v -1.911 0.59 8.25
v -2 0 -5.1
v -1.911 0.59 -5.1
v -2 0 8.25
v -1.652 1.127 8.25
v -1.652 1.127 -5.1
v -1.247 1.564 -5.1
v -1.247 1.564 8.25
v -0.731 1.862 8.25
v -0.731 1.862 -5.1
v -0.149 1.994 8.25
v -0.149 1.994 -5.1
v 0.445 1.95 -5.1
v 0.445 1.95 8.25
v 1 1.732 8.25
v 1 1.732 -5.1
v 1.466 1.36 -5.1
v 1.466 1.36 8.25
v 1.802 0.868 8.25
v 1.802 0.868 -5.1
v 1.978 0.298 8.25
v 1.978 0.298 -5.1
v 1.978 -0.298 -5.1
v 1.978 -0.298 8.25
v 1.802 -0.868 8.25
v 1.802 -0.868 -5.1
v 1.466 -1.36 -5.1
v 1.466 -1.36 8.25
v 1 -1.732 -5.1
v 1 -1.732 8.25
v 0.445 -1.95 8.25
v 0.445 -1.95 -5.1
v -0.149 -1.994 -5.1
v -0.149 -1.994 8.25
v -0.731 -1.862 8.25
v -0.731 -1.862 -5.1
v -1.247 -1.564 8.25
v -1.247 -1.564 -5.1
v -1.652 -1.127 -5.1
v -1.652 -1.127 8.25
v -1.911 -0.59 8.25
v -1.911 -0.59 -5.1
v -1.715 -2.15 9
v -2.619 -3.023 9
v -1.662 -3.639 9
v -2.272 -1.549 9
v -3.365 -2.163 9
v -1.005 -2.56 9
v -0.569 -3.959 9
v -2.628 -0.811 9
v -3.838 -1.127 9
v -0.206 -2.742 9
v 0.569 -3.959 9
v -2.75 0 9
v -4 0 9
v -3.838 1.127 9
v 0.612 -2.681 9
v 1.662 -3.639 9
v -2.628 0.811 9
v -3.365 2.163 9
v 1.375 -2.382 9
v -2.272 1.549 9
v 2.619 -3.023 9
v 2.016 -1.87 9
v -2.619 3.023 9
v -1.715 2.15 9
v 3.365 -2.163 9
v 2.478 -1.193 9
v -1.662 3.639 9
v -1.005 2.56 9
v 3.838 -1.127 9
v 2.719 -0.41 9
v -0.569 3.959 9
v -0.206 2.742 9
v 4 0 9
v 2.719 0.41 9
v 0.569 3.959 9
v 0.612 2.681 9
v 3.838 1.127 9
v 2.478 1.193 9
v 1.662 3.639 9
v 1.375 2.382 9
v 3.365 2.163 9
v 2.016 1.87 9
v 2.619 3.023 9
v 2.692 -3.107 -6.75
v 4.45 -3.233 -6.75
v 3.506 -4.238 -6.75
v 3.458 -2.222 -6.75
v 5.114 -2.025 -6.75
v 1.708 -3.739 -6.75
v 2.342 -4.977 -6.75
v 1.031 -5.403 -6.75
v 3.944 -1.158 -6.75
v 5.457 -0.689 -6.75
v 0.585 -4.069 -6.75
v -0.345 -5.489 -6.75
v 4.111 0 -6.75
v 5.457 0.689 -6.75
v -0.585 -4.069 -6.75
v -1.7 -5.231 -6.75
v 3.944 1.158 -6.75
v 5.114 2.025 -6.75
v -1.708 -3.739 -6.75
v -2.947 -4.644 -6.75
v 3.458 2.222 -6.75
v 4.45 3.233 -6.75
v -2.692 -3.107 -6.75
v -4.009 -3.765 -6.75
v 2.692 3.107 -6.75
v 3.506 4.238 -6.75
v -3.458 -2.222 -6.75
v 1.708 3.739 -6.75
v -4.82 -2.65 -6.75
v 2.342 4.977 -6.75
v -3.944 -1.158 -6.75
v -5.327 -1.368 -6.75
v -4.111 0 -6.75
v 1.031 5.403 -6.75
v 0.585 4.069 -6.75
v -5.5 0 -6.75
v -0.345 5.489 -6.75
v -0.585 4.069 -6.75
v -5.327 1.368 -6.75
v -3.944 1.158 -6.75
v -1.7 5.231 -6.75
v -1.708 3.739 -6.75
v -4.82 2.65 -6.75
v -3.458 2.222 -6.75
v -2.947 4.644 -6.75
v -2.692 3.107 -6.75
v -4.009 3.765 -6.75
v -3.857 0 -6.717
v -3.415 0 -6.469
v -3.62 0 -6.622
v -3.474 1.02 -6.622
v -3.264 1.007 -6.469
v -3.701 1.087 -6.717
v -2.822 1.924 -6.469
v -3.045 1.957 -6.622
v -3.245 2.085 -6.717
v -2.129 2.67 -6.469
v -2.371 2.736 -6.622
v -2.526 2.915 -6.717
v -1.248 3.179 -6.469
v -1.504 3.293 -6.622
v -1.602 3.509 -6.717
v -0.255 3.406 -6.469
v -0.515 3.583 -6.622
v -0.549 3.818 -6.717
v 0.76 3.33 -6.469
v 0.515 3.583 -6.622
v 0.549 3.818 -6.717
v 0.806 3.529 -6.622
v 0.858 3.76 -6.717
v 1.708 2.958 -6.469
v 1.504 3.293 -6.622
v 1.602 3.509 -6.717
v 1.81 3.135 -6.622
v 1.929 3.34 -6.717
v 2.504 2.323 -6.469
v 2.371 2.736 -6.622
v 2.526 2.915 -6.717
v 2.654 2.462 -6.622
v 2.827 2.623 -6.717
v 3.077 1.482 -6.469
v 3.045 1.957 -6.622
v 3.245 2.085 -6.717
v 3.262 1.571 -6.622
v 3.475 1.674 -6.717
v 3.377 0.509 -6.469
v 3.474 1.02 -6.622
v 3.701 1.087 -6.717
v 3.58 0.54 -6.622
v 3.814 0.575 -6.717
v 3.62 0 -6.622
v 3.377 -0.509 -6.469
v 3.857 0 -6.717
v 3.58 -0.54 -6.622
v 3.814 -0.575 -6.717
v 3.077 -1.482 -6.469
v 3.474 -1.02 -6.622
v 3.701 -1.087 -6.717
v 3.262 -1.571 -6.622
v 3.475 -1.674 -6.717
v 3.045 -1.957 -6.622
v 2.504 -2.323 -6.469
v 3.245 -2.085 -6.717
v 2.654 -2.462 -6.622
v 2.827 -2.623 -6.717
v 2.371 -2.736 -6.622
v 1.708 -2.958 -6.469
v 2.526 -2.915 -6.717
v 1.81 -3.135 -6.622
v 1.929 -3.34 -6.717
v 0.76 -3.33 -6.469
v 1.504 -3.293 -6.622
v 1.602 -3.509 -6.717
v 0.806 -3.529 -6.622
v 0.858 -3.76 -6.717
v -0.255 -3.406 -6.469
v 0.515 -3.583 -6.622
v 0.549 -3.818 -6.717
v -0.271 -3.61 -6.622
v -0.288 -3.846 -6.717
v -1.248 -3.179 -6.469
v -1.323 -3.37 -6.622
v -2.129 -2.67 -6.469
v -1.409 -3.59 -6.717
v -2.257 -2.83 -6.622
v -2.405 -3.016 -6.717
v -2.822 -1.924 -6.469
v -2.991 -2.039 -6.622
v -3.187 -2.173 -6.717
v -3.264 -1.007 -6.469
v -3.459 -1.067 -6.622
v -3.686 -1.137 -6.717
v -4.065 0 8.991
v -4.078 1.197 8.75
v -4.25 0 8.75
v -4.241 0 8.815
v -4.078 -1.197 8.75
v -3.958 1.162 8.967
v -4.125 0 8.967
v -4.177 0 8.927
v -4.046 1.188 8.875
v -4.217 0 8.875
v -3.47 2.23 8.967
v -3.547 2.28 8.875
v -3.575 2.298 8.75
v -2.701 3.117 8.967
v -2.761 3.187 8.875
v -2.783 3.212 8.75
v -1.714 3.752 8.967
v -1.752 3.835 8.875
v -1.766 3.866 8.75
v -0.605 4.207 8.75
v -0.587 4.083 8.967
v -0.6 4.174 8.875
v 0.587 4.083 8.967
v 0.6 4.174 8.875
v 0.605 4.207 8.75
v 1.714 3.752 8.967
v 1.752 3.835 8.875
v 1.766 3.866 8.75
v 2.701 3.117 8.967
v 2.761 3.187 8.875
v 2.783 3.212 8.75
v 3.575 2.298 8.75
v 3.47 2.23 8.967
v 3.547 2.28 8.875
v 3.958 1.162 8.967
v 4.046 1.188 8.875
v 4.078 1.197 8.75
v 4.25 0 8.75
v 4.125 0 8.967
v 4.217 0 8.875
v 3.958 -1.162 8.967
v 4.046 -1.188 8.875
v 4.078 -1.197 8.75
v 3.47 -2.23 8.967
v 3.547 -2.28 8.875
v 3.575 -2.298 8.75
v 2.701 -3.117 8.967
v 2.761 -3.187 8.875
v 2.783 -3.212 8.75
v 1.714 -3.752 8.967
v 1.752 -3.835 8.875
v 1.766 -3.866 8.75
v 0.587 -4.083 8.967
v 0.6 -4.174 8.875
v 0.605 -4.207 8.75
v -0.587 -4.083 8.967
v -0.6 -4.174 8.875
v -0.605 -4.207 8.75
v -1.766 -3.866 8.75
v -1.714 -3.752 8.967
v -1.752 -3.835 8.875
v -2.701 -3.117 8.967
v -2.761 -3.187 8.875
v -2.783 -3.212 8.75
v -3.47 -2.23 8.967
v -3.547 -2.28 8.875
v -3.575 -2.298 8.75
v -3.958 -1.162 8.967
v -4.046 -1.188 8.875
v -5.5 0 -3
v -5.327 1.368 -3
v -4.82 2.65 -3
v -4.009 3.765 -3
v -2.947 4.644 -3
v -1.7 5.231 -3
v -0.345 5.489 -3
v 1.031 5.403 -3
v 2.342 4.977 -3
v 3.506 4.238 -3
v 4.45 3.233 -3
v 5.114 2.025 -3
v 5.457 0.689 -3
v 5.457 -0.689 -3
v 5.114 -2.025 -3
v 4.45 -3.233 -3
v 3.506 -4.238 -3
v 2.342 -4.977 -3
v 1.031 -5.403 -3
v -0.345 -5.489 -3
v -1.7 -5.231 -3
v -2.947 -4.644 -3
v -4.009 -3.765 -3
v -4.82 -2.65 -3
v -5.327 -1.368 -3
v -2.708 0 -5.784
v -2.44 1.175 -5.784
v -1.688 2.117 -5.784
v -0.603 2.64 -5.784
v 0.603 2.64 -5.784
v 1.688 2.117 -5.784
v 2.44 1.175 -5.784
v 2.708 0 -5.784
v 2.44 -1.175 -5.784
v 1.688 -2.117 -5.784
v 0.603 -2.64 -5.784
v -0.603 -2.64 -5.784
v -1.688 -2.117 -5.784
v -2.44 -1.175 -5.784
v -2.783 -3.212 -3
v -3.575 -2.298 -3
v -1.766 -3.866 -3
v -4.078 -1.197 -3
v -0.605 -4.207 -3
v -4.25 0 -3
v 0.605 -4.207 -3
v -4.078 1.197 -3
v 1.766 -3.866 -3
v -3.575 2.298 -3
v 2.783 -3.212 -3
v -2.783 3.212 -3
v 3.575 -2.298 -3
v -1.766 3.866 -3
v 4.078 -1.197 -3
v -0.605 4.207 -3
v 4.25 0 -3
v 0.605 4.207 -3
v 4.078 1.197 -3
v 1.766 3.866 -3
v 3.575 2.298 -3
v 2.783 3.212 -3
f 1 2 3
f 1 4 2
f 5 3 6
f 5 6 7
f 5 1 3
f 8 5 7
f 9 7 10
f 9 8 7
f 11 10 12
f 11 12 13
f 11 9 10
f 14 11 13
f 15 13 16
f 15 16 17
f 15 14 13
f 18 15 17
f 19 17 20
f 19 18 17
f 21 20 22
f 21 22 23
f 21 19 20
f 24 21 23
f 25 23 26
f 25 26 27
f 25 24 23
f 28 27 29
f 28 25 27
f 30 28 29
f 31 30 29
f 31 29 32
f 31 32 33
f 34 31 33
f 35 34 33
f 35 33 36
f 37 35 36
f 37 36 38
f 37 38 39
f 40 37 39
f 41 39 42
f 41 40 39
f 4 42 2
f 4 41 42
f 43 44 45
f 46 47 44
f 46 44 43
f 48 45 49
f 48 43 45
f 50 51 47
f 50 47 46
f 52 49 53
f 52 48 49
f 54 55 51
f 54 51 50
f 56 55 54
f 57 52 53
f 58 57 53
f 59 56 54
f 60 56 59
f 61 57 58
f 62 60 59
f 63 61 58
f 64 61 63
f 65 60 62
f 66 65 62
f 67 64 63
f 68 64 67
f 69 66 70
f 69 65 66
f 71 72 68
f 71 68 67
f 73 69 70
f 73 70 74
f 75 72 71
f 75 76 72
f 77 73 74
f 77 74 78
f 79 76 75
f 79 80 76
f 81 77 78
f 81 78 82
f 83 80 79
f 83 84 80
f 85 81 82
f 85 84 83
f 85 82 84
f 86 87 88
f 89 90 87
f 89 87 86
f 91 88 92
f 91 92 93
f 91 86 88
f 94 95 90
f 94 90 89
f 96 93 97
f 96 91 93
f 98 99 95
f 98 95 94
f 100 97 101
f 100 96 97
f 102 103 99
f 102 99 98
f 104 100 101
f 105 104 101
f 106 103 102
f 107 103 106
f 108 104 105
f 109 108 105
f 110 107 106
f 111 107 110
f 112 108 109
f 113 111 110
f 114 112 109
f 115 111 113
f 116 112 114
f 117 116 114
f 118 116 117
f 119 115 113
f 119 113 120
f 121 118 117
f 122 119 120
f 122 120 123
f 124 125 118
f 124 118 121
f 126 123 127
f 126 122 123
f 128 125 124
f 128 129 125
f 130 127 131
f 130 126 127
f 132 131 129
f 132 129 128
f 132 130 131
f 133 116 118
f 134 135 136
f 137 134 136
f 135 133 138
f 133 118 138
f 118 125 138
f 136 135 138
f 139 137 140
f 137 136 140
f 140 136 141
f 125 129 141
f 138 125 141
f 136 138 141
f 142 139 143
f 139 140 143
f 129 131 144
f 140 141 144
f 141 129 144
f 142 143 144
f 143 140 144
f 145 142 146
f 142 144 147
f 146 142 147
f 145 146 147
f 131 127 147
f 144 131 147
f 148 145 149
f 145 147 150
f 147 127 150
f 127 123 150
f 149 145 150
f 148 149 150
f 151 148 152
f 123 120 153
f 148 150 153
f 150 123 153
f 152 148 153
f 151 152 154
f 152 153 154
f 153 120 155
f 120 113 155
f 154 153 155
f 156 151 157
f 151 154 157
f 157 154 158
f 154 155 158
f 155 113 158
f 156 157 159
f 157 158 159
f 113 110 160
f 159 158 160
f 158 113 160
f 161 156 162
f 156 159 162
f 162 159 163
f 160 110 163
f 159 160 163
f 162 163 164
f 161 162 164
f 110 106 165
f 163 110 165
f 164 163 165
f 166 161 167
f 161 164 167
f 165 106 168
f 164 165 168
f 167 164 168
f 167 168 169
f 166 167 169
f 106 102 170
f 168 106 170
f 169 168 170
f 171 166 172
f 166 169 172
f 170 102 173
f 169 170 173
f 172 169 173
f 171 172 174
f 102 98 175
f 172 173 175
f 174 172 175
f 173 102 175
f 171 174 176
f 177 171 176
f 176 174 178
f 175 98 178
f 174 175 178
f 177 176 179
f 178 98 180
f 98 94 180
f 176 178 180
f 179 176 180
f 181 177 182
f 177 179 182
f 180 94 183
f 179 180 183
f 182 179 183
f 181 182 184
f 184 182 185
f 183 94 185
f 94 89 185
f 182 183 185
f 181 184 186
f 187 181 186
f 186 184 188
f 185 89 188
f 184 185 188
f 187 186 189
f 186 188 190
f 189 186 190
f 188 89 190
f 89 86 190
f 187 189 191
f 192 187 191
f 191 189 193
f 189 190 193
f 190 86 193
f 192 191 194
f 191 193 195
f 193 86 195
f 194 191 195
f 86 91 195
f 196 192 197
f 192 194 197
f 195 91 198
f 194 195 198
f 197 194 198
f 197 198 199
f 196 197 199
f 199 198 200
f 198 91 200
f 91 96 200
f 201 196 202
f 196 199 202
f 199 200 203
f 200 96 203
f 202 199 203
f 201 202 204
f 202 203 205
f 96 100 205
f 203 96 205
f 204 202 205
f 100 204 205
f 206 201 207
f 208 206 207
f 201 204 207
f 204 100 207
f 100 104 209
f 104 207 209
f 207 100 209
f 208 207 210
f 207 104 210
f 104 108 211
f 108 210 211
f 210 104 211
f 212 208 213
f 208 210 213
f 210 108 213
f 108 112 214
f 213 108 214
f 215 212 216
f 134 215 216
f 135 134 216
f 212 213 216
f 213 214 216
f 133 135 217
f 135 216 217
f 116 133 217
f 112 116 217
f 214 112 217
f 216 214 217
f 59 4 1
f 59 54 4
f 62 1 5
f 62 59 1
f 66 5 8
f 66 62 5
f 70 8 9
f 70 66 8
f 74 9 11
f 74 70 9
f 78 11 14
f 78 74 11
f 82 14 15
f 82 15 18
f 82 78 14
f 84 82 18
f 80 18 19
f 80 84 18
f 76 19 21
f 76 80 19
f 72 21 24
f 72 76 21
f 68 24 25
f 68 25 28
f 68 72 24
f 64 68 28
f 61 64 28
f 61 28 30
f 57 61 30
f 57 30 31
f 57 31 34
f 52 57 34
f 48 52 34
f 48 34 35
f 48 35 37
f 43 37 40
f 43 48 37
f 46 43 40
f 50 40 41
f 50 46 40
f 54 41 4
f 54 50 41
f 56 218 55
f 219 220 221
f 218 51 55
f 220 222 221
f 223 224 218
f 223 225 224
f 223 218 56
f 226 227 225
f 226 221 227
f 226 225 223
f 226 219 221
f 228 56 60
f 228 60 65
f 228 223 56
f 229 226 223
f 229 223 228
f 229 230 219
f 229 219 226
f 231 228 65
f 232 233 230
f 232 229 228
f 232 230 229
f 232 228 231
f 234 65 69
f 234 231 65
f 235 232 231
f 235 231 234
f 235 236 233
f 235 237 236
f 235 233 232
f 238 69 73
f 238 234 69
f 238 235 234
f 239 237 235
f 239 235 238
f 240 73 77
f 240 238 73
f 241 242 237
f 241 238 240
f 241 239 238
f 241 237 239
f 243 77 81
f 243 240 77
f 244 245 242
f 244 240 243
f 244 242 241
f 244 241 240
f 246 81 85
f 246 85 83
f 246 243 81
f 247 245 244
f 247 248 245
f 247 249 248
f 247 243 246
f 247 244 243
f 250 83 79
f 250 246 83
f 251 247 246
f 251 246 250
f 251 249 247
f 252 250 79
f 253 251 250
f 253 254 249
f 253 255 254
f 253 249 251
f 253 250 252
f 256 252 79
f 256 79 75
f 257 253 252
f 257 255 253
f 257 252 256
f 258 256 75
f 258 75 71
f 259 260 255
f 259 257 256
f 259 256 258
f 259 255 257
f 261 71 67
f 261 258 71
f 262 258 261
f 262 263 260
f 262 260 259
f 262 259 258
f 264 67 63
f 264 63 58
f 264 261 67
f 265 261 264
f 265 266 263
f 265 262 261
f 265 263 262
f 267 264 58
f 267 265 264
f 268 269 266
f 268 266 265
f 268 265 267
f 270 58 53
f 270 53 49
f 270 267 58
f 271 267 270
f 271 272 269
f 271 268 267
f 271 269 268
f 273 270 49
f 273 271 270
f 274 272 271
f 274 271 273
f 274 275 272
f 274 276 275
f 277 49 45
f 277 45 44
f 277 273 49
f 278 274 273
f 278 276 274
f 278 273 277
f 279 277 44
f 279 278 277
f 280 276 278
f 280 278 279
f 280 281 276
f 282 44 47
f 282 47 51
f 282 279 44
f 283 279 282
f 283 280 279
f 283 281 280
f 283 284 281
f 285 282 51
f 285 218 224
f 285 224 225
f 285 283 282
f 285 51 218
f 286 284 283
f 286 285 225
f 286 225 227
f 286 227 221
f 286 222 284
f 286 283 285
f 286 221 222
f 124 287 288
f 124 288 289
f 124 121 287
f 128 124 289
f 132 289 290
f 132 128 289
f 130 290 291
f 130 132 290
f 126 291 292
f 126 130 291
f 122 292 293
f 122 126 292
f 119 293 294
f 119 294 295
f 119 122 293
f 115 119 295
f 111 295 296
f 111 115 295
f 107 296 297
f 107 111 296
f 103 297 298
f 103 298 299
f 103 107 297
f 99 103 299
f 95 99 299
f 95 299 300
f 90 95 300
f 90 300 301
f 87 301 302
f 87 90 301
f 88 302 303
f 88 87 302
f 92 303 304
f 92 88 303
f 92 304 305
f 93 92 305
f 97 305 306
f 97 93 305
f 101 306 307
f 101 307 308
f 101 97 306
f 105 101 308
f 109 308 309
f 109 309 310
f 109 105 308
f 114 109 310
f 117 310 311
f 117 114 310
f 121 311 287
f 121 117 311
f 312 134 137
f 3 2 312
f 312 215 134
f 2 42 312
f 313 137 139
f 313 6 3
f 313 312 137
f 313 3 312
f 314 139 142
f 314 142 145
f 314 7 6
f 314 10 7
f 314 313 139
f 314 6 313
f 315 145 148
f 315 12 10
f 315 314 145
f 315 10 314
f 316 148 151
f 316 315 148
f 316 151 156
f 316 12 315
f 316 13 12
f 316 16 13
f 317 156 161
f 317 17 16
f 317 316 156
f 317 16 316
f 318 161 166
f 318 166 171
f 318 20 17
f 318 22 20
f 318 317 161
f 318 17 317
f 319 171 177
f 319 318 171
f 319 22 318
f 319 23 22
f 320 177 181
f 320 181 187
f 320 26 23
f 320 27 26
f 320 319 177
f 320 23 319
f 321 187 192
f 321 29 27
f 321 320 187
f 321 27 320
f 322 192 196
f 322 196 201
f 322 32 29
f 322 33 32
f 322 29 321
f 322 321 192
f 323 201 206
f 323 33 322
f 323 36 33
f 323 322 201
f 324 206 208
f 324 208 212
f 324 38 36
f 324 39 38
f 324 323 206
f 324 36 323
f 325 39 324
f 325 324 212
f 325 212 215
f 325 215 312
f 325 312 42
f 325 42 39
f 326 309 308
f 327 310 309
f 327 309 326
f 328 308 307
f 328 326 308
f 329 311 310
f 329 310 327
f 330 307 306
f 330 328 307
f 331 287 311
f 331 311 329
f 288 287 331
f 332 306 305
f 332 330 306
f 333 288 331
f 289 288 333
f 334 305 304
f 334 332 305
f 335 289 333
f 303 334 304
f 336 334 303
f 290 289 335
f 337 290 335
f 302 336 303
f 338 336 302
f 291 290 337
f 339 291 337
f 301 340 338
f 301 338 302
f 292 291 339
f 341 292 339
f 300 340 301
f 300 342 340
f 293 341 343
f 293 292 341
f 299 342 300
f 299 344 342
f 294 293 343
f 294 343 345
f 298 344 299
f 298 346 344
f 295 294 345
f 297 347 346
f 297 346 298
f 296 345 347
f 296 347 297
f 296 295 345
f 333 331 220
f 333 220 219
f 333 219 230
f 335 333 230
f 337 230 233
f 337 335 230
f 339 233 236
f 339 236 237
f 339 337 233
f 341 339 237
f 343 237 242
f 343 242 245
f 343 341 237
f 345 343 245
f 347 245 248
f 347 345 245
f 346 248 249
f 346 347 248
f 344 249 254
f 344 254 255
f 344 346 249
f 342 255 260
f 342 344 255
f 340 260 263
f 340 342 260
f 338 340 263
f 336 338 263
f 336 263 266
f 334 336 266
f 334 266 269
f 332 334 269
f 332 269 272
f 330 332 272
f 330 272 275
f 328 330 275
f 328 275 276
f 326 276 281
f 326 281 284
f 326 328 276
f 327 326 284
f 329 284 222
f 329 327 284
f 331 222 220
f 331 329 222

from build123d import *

# Parameters (mm, degrees)
F2_R = 0.25
F3_R = 1


with BuildPart() as f1:
    # F0 (on Front) → F1 (revolve)
    with BuildSketch(Plane.XZ):
        Polygon((-2, 8.25), (-2.75, 9), (-4.25, 9), (-4.25, 6.75), (-4.25, 6), (-4.25, -3), (-5.5, -3), (-5.5, -6.75), (-4.25, -6.75), (-3.706053, -6.75), (-2, -5.100015), align=None)
    revolve(axis=Axis((0, 0, 1.255823), (0, 0, -1)))

    # F2
    f2_edges = [f1.edges().sort_by_distance(p)[0] for p in [
        (4.25, 0, 9),
    ]]
    fillet(f2_edges, radius=F2_R)

    # F3
    f3_edges = [f1.edges().sort_by_distance(p)[0] for p in [
        (3.706053, 0, -6.75),
    ]]
    fillet(f3_edges, radius=F3_R)


solid = f1.part
